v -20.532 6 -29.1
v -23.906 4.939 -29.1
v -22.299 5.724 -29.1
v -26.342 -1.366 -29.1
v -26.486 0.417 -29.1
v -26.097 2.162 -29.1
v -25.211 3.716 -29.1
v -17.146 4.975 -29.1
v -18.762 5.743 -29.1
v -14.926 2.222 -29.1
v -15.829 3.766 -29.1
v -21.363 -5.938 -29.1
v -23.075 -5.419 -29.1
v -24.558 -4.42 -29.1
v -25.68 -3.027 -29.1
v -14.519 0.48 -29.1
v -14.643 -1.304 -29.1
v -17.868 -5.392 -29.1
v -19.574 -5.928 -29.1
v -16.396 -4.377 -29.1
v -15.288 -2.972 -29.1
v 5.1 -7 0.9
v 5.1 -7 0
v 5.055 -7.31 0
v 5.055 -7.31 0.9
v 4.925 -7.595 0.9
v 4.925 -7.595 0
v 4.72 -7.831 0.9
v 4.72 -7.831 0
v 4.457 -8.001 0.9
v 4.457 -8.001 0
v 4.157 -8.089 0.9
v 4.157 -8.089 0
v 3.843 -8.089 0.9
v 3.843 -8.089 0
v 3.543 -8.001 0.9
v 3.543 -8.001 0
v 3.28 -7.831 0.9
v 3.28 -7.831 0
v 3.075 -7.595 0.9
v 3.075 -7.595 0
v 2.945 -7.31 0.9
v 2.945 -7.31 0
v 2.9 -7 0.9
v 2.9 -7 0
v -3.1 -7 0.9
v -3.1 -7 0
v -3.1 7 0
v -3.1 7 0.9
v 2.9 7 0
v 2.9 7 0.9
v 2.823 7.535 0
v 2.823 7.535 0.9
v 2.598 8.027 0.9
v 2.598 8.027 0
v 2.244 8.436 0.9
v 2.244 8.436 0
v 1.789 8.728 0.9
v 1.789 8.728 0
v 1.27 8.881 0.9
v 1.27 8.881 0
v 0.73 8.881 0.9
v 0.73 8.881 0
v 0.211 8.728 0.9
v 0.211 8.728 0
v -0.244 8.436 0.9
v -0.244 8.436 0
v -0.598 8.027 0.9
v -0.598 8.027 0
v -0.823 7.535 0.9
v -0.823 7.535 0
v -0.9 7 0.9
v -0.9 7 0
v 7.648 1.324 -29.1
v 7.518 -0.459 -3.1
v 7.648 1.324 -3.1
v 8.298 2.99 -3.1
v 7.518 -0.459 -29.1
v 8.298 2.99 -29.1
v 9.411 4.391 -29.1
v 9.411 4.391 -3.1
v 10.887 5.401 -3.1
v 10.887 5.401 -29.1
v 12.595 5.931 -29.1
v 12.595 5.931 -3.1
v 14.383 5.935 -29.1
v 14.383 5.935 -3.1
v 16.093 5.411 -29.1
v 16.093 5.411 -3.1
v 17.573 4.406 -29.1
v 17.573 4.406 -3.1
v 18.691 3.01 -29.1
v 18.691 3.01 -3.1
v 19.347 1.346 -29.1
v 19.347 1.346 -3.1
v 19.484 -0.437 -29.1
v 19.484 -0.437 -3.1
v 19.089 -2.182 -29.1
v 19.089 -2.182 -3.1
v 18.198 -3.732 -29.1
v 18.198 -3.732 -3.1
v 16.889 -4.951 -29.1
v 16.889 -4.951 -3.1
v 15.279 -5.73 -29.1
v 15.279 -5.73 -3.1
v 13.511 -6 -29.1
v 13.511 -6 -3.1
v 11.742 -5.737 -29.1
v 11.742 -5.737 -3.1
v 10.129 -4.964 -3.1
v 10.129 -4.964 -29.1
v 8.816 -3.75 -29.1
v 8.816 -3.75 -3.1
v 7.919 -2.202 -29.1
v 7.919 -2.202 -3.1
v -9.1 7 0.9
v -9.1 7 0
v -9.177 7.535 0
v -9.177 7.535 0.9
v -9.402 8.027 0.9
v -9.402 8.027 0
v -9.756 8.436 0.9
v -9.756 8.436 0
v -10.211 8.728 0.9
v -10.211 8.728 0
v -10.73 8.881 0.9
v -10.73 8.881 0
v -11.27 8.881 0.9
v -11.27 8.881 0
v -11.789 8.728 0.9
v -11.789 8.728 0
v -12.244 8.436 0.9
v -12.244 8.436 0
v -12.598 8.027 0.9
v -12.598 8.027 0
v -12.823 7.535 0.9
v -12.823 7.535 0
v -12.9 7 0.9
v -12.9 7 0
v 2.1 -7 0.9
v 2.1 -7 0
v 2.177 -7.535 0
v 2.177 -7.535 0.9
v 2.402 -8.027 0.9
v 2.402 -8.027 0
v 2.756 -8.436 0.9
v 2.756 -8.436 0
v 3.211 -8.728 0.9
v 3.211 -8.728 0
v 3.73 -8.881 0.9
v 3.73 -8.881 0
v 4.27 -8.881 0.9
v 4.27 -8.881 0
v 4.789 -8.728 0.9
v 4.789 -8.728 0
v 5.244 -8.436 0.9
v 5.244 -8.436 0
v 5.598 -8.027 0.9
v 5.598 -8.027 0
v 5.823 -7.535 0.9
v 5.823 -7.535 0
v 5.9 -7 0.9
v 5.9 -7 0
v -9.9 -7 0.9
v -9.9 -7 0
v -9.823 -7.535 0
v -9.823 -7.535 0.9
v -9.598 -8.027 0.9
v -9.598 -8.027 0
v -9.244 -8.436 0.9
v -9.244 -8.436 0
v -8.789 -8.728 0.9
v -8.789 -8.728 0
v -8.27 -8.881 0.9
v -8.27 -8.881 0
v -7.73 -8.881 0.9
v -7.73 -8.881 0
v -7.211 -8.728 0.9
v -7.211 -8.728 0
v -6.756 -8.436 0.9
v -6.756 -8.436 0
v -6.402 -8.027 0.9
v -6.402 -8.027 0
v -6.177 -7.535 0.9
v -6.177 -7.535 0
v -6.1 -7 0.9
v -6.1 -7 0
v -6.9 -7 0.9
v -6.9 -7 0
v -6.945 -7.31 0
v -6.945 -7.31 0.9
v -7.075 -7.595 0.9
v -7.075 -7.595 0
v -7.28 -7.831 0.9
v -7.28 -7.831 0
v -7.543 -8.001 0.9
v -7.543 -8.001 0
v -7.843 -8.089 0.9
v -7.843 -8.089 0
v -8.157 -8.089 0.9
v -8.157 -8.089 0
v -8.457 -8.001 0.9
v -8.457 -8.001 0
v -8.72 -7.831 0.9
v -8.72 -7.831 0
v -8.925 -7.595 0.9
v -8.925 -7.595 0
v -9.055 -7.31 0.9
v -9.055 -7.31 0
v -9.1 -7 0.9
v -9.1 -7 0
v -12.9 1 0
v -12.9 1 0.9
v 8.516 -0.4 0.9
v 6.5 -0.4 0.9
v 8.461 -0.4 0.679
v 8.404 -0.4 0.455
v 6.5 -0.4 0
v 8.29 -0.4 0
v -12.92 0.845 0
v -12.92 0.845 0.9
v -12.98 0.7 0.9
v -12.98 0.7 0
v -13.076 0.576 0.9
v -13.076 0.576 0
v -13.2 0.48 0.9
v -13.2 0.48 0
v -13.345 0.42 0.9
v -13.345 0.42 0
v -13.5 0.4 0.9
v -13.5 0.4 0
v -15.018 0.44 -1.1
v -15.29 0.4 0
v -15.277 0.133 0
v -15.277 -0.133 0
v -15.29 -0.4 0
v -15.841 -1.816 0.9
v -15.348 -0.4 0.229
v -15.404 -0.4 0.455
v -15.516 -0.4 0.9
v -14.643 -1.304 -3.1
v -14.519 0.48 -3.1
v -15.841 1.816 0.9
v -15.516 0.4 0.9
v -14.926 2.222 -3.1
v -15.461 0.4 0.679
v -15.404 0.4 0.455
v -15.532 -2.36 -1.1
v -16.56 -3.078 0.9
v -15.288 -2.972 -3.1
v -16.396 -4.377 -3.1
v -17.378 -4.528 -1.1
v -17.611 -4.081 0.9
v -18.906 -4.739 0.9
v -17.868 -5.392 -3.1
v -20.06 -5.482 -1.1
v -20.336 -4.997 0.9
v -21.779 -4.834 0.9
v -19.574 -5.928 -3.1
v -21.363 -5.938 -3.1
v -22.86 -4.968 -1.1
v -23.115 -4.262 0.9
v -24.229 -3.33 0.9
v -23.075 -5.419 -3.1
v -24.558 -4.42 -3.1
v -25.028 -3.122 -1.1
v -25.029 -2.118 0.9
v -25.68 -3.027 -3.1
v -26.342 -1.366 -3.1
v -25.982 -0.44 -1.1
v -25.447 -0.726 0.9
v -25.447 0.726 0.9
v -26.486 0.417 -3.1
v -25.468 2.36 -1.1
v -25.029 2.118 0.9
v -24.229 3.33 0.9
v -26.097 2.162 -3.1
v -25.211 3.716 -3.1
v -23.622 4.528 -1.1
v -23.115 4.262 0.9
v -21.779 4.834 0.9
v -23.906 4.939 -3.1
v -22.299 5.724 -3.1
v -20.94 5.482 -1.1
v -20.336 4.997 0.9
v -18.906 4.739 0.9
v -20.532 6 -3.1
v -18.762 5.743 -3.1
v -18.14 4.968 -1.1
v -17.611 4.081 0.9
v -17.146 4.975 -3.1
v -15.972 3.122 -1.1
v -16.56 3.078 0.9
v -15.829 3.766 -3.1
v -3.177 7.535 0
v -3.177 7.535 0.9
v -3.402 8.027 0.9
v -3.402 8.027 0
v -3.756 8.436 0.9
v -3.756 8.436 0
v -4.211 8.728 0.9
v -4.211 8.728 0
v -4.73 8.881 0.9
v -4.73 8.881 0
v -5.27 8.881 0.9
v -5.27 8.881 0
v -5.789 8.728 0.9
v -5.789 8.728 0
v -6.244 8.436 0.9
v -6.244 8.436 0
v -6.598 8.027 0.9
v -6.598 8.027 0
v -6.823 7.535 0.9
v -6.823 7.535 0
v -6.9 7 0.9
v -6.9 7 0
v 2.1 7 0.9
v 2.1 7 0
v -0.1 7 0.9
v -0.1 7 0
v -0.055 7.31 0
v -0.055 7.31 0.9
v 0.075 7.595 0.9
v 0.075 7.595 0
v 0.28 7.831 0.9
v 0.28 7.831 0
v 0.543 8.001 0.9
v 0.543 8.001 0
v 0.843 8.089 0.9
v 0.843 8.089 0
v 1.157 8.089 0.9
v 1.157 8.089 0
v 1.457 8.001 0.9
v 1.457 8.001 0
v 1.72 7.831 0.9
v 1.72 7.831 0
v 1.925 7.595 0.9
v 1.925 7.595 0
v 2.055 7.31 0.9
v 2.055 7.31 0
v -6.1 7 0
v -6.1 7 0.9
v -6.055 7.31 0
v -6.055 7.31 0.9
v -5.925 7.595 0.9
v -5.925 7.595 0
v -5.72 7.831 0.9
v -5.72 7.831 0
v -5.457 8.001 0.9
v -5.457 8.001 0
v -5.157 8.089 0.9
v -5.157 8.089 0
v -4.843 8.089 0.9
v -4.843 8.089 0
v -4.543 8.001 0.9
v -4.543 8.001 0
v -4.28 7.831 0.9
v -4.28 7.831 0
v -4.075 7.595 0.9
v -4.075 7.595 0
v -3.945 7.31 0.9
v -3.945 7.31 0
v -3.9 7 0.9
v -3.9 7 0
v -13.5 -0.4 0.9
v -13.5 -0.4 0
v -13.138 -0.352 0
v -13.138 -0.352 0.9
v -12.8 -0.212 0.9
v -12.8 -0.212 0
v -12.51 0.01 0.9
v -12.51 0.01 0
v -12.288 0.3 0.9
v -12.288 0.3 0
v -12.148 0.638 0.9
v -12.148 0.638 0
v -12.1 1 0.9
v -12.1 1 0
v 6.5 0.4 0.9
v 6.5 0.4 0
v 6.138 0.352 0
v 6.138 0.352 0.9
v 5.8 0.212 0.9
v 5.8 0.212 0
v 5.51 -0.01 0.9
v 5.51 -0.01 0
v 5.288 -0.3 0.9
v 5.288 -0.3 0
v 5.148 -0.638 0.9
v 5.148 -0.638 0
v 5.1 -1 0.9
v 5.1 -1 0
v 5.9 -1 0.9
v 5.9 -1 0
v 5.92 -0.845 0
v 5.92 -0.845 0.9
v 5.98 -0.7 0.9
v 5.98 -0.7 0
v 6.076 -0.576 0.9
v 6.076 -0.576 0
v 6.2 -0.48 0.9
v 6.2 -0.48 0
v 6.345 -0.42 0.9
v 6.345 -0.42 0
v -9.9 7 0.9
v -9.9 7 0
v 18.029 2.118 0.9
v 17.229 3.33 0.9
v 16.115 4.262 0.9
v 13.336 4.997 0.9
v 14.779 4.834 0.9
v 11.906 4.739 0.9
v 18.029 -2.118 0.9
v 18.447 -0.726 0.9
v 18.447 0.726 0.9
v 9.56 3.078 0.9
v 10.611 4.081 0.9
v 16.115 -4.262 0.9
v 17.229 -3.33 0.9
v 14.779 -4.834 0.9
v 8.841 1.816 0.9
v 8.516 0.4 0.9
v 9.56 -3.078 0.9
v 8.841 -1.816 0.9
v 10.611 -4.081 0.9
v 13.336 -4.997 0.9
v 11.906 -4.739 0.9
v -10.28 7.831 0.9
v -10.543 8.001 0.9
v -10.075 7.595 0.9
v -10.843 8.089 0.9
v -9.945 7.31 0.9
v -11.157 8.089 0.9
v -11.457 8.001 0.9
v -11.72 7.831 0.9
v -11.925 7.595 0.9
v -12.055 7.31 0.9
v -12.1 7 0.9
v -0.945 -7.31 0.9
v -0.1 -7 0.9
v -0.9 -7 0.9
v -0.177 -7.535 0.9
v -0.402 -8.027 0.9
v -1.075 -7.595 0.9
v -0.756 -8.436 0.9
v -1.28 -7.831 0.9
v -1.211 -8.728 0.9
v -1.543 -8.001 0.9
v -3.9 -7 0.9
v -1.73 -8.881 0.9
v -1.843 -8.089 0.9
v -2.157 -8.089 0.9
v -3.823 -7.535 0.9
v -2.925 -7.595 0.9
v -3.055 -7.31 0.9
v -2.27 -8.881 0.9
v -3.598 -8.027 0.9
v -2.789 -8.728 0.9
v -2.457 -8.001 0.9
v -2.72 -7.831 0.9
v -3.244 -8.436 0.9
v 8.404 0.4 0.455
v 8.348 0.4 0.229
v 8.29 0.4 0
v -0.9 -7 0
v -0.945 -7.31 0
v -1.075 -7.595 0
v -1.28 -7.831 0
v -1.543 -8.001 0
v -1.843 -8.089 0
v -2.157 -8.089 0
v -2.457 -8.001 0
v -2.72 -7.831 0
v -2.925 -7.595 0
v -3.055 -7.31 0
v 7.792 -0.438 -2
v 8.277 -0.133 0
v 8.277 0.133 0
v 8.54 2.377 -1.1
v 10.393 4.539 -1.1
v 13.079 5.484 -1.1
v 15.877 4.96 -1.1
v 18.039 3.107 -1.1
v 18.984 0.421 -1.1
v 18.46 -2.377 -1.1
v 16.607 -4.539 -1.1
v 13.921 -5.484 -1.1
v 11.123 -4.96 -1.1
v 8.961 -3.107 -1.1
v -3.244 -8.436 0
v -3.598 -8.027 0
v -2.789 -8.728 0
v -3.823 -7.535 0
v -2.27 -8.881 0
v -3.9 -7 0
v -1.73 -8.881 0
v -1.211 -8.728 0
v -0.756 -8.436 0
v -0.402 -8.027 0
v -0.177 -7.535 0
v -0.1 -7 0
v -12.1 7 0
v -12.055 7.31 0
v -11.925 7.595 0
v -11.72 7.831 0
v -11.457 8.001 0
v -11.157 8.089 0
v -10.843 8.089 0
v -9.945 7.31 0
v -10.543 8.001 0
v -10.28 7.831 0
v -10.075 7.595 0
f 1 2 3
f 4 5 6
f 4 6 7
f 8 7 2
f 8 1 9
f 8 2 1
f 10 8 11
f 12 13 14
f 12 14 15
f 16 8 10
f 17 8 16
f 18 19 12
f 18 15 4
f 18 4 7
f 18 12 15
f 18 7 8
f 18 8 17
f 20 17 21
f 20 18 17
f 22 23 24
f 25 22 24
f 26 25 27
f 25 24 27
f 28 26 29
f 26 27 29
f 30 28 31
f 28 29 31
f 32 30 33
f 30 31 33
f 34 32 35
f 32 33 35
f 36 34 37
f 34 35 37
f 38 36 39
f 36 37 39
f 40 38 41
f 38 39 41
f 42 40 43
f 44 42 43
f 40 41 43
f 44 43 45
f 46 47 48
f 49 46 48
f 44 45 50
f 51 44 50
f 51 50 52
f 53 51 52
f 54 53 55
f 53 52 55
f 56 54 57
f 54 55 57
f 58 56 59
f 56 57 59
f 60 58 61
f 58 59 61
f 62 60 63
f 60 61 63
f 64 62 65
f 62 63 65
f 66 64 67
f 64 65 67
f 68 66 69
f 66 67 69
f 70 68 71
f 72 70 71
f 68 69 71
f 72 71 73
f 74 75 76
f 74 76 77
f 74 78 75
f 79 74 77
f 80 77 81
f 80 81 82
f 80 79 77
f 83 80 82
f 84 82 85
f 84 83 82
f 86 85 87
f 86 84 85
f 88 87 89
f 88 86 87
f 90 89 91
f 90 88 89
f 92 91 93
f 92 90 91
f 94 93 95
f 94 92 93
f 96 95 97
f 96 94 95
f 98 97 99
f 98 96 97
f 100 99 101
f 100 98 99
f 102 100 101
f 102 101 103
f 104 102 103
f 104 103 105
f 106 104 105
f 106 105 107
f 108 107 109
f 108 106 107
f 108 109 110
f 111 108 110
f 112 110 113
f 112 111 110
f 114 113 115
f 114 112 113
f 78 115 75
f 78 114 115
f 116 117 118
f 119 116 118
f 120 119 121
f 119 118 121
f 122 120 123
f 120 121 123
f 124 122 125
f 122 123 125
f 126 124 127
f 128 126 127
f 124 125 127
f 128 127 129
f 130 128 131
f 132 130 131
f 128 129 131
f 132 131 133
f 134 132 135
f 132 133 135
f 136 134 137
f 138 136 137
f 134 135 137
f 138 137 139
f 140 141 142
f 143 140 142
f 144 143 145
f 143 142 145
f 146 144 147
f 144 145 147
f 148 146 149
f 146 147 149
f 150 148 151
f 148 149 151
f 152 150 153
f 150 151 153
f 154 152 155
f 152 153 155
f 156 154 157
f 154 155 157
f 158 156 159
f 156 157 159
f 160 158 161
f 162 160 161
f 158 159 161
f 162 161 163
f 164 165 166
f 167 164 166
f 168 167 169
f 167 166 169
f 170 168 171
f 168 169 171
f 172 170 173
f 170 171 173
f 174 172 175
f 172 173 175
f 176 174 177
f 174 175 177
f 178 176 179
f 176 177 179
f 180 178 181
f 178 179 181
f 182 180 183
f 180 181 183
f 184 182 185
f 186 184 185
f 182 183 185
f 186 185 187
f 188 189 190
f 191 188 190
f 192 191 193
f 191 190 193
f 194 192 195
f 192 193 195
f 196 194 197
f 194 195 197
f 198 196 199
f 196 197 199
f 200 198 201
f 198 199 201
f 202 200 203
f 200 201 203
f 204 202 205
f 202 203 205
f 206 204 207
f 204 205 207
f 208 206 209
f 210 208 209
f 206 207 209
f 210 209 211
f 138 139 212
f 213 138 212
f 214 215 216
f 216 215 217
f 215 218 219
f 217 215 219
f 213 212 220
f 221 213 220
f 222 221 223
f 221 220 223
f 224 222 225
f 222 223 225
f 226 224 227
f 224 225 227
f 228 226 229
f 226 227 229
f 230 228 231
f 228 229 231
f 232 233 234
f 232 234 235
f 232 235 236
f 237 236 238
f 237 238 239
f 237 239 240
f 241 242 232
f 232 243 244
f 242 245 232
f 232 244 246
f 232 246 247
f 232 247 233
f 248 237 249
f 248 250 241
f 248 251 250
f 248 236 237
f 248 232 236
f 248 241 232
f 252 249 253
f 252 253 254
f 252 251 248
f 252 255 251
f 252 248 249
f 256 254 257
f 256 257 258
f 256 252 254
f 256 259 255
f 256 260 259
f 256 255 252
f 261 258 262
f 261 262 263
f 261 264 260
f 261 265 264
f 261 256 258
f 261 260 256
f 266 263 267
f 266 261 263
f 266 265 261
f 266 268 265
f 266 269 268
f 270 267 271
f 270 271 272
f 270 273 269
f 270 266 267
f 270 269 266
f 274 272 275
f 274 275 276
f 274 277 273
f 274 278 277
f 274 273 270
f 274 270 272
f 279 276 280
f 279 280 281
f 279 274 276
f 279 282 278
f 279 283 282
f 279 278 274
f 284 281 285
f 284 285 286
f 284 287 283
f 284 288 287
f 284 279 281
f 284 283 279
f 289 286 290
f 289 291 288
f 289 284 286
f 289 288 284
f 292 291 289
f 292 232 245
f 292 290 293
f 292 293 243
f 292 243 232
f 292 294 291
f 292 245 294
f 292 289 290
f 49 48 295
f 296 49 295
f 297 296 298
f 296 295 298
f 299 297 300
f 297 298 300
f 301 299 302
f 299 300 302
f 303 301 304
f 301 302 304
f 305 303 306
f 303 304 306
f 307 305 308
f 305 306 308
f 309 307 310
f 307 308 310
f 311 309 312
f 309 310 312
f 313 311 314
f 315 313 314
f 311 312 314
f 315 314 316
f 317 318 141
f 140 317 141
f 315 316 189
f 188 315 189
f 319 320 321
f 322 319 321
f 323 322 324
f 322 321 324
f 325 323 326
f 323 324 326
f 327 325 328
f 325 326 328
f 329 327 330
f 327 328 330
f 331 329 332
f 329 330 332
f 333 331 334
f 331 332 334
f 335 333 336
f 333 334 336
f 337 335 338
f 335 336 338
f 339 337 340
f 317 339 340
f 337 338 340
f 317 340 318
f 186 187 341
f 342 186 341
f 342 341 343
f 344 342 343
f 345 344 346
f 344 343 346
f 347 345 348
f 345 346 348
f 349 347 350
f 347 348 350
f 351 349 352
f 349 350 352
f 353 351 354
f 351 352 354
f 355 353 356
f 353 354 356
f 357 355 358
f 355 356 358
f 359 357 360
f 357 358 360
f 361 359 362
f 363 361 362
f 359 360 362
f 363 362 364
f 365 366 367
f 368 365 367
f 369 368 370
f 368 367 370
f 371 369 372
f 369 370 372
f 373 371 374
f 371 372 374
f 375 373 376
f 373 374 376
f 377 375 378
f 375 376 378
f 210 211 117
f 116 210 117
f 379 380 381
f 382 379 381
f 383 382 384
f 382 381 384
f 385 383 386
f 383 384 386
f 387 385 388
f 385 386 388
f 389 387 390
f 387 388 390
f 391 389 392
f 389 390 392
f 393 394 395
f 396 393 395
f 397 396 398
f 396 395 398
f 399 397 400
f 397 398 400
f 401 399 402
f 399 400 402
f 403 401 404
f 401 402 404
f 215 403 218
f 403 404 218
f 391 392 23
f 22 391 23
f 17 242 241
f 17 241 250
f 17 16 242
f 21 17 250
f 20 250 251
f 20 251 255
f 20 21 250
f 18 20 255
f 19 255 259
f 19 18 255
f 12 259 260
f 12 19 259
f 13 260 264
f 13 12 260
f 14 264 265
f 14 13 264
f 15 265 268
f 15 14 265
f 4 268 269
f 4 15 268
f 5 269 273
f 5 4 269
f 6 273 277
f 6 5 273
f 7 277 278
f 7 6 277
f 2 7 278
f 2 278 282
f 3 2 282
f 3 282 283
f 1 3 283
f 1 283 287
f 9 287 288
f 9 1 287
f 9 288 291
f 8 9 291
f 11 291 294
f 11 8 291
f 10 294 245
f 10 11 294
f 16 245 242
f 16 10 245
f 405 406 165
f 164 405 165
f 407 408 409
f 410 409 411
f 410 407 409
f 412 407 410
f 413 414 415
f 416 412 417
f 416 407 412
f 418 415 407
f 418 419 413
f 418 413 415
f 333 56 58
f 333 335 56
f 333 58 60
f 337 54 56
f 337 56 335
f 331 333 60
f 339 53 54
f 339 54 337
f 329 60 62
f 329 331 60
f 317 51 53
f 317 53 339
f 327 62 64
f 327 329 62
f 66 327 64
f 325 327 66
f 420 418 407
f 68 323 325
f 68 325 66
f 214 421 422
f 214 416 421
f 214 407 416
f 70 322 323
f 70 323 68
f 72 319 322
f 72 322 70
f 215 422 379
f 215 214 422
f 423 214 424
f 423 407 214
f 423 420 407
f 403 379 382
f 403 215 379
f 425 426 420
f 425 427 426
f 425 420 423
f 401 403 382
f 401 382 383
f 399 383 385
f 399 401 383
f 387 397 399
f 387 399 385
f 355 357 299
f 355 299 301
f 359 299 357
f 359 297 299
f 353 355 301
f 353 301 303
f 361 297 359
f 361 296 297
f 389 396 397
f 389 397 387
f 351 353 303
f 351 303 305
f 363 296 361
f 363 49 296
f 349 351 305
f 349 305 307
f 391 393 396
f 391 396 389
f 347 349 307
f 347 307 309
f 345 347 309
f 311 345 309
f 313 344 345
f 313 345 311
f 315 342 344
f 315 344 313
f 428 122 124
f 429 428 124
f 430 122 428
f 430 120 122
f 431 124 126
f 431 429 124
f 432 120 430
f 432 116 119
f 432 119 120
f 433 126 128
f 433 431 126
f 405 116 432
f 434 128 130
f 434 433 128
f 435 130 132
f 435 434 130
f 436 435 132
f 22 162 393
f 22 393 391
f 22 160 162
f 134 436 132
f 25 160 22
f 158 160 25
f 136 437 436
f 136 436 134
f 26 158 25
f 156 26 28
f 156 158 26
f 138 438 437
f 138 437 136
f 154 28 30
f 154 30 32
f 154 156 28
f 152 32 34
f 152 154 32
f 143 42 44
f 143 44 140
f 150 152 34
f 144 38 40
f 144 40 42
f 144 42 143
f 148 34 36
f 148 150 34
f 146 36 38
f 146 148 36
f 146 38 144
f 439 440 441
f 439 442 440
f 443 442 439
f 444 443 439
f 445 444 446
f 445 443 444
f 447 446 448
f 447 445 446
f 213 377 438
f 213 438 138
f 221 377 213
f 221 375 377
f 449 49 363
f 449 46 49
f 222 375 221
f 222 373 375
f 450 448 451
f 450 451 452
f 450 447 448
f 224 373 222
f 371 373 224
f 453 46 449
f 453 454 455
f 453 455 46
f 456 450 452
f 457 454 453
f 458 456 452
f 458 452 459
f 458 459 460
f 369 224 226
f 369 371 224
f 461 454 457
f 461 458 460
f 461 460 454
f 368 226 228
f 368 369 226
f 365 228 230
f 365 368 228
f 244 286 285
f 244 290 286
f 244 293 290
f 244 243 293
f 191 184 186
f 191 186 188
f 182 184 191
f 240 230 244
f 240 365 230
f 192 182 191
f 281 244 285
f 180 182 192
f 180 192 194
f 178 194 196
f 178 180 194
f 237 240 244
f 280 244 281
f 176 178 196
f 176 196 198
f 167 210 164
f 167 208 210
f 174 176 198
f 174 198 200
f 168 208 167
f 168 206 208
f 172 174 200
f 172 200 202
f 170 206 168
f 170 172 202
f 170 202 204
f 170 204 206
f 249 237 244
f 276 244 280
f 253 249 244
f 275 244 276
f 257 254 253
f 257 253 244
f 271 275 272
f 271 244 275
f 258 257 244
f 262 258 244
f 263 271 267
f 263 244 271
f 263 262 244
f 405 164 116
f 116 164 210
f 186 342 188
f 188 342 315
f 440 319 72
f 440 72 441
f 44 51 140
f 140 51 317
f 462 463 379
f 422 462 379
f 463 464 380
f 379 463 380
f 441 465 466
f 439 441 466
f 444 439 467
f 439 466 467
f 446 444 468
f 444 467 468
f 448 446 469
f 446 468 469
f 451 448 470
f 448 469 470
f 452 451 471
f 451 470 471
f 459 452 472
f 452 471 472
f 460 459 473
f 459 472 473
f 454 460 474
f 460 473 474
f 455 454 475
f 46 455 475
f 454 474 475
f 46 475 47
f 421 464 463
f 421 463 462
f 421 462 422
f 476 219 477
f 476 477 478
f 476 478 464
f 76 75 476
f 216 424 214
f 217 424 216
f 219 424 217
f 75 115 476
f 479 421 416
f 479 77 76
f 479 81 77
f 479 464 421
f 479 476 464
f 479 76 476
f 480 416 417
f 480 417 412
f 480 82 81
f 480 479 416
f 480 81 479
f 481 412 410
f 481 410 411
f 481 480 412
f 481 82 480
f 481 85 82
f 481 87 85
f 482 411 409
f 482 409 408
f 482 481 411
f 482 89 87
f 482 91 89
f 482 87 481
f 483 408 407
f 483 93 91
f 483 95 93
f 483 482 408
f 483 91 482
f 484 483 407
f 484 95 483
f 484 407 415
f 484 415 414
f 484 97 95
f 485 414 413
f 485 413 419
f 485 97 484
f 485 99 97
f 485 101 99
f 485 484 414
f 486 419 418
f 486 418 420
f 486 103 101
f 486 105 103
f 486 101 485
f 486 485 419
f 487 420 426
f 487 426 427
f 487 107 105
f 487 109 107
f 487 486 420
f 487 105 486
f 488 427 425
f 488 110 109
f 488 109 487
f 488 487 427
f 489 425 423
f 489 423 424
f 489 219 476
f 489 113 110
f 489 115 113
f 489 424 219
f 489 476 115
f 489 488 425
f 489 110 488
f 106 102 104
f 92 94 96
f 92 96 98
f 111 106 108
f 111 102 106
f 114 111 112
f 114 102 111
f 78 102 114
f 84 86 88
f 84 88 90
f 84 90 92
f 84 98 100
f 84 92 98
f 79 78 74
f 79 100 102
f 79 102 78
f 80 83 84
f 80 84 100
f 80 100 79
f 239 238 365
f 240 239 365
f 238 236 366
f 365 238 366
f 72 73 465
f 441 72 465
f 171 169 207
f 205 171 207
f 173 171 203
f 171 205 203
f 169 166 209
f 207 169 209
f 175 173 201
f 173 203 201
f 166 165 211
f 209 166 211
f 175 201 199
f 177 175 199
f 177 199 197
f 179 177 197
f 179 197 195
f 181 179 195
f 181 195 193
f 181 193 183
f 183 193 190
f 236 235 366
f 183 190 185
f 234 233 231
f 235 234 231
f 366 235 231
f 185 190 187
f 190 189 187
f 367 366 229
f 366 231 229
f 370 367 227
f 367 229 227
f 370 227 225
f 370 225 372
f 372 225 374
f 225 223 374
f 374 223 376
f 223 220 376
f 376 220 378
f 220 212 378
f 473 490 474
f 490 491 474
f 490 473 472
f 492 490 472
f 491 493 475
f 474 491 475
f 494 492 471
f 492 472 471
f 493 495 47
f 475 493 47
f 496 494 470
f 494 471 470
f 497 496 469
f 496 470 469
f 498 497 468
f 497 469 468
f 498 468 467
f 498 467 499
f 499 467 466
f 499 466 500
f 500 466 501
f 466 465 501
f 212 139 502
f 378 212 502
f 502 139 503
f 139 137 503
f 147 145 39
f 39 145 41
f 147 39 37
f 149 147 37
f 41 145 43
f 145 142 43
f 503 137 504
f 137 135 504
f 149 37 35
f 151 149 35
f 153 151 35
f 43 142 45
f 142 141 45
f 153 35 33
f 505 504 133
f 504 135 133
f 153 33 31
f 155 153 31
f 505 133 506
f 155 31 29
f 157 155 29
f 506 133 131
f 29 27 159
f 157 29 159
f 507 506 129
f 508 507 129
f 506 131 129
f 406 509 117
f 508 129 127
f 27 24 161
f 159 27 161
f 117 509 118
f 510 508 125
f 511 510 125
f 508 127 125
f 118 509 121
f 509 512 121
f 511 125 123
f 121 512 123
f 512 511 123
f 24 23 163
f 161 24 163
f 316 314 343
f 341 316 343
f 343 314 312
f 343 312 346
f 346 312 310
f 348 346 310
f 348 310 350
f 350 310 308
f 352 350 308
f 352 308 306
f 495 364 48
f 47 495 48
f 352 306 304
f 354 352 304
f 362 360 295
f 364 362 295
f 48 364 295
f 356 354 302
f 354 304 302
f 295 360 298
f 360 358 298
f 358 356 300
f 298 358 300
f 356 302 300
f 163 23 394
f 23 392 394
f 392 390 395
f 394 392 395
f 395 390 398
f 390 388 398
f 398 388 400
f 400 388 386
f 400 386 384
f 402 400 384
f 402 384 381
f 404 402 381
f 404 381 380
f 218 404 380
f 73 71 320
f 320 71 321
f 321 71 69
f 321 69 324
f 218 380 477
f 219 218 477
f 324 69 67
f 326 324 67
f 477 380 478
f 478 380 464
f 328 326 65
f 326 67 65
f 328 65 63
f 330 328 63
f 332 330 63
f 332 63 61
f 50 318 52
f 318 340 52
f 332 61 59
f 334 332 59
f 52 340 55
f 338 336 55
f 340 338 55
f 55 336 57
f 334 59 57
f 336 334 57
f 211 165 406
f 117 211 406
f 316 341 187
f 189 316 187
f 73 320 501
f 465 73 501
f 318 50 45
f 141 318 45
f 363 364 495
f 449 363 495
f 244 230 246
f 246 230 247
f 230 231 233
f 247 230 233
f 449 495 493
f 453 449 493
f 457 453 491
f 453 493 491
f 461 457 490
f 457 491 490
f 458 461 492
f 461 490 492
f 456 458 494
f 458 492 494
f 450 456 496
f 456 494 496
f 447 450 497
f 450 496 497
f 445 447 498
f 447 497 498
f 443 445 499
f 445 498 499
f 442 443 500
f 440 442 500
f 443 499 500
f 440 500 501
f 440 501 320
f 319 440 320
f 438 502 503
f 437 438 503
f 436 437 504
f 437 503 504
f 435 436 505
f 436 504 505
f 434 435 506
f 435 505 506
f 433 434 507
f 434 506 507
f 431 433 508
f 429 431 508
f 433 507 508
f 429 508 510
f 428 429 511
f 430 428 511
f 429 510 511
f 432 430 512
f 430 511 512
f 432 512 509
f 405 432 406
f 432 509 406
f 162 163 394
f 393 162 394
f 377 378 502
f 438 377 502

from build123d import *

# Parameters (mm, degrees)
BOSS_EXTRUDE1_DEPTH = 0.9


with BuildPart() as part:
    # Sketch2 → Boss-Extrude1 (new body)
    with BuildSketch(Plane.XY):
        with BuildLine():
            Line((-20.5, -0.4), (-13.5, -0.4))
            ThreePointArc((-13.5, -0.4), (-12.510050506, 0.010050506), (-12.1, 1))
            Line((-12.1, 1), (-12.1, 7))
            ThreePointArc((-12.1, 7), (-11, 8.1), (-9.9, 7))
            Line((-9.9, 7), (-9.9, 0))
            Line((-9.9, 0), (-9.9, -7))
            ThreePointArc((-9.9, -7), (-8, -8.9), (-6.1, -7))
            Line((-6.1, -7), (-6.1, 0))
            Line((-6.1, 0), (-6.1, 7))
            ThreePointArc((-6.1, 7), (-5, 8.1), (-3.9, 7))
            Line((-3.9, 7), (-3.9, 0))
            Line((-3.9, 0), (-3.9, -7))
            ThreePointArc((-3.9, -7), (-2, -8.9), (-0.1, -7))
            Line((-0.1, -7), (-0.1, 0))
            Line((-0.1, 0), (-0.1, 7))
            ThreePointArc((-0.1, 7), (1, 8.1), (2.1, 7))
            Line((2.1, 7), (2.1, 0))
            Line((2.1, 0), (2.1, -7))
            ThreePointArc((2.1, -7), (4, -8.9), (5.9, -7))
            Line((5.9, -7), (5.9, -1))
            ThreePointArc((5.9, -1), (6.075735931, -0.575735931), (6.5, -0.4))
            Line((6.5, -0.4), (13.5, -0.4))
            ThreePointArc((13.5, -0.4), (13.9, 0), (13.5, 0.4))
            Line((13.5, 0.4), (6.5, 0.4))
            ThreePointArc((6.5, 0.4), (5.510050506, -0.010050506), (5.1, -1))
            Line((5.1, -1), (5.1, -7))
            ThreePointArc((5.1, -7), (4, -8.1), (2.9, -7))
            Line((2.9, -7), (2.9, 0))
            Line((2.9, 0), (2.9, 7))
            ThreePointArc((2.9, 7), (1, 8.9), (-0.9, 7))
            Line((-0.9, 7), (-0.9, 0))
            Line((-0.9, 0), (-0.9, -7))
            ThreePointArc((-0.9, -7), (-2, -8.1), (-3.1, -7))
            Line((-3.1, -7), (-3.1, 0))
            Line((-3.1, 0), (-3.1, 7))
            ThreePointArc((-3.1, 7), (-5, 8.9), (-6.9, 7))
            Line((-6.9, 7), (-6.9, 0))
            Line((-6.9, 0), (-6.9, -7))
            ThreePointArc((-6.9, -7), (-8, -8.1), (-9.1, -7))
            Line((-9.1, -7), (-9.1, 0))
            Line((-9.1, 0), (-9.1, 7))
            ThreePointArc((-9.1, 7), (-11, 8.9), (-12.9, 7))
            Line((-12.9, 7), (-12.9, 1))
            ThreePointArc((-12.9, 1), (-13.075735931, 0.575735931), (-13.5, 0.4))
            Line((-13.5, 0.4), (-20.5, 0.4))
            ThreePointArc((-20.5, 0.4), (-20.9, 0), (-20.5, -0.4))
        make_face()
    extrude(amount=BOSS_EXTRUDE1_DEPTH)

    # Sketch3 → Revolve1 (revolve)
    with BuildSketch(Plane(origin=(0, 0, 0), x_dir=(1, 0, 0), z_dir=(0, 1, 0)), mode=Mode.PRIVATE) as revolve1_sk:
        Polygon((-20.5, -0.9), (-25.5, -0.9), (-26.5, 3.1), (-26.5, 29.1), (-20.5, 29.1), align=None)
    revolve(revolve1_sk.sketch.rotate(Axis((-20.5, 0, 0.9), (0, 0, -1)), 175.411434264), axis=Axis((-20.5, 0, 0.9), (0, 0, -1)))

    # Sketch4 → Revolve2 (revolve)
    with BuildSketch(Plane(origin=(0, 0, 0), x_dir=(1, 0, 0), z_dir=(0, 1, 0)), mode=Mode.PRIVATE) as revolve2_sk:
        Polygon((13.5, -0.9), (18.5, -0.9), (19.5, 3.1), (19.5, 29.1), (13.5, 29.1), align=None)
    revolve(revolve2_sk.sketch.rotate(Axis((13.5, 0, 0.9), (0, 0, -1)), 175.609427397), axis=Axis((13.5, 0, 0.9), (0, 0, -1)))


solid = part.part
